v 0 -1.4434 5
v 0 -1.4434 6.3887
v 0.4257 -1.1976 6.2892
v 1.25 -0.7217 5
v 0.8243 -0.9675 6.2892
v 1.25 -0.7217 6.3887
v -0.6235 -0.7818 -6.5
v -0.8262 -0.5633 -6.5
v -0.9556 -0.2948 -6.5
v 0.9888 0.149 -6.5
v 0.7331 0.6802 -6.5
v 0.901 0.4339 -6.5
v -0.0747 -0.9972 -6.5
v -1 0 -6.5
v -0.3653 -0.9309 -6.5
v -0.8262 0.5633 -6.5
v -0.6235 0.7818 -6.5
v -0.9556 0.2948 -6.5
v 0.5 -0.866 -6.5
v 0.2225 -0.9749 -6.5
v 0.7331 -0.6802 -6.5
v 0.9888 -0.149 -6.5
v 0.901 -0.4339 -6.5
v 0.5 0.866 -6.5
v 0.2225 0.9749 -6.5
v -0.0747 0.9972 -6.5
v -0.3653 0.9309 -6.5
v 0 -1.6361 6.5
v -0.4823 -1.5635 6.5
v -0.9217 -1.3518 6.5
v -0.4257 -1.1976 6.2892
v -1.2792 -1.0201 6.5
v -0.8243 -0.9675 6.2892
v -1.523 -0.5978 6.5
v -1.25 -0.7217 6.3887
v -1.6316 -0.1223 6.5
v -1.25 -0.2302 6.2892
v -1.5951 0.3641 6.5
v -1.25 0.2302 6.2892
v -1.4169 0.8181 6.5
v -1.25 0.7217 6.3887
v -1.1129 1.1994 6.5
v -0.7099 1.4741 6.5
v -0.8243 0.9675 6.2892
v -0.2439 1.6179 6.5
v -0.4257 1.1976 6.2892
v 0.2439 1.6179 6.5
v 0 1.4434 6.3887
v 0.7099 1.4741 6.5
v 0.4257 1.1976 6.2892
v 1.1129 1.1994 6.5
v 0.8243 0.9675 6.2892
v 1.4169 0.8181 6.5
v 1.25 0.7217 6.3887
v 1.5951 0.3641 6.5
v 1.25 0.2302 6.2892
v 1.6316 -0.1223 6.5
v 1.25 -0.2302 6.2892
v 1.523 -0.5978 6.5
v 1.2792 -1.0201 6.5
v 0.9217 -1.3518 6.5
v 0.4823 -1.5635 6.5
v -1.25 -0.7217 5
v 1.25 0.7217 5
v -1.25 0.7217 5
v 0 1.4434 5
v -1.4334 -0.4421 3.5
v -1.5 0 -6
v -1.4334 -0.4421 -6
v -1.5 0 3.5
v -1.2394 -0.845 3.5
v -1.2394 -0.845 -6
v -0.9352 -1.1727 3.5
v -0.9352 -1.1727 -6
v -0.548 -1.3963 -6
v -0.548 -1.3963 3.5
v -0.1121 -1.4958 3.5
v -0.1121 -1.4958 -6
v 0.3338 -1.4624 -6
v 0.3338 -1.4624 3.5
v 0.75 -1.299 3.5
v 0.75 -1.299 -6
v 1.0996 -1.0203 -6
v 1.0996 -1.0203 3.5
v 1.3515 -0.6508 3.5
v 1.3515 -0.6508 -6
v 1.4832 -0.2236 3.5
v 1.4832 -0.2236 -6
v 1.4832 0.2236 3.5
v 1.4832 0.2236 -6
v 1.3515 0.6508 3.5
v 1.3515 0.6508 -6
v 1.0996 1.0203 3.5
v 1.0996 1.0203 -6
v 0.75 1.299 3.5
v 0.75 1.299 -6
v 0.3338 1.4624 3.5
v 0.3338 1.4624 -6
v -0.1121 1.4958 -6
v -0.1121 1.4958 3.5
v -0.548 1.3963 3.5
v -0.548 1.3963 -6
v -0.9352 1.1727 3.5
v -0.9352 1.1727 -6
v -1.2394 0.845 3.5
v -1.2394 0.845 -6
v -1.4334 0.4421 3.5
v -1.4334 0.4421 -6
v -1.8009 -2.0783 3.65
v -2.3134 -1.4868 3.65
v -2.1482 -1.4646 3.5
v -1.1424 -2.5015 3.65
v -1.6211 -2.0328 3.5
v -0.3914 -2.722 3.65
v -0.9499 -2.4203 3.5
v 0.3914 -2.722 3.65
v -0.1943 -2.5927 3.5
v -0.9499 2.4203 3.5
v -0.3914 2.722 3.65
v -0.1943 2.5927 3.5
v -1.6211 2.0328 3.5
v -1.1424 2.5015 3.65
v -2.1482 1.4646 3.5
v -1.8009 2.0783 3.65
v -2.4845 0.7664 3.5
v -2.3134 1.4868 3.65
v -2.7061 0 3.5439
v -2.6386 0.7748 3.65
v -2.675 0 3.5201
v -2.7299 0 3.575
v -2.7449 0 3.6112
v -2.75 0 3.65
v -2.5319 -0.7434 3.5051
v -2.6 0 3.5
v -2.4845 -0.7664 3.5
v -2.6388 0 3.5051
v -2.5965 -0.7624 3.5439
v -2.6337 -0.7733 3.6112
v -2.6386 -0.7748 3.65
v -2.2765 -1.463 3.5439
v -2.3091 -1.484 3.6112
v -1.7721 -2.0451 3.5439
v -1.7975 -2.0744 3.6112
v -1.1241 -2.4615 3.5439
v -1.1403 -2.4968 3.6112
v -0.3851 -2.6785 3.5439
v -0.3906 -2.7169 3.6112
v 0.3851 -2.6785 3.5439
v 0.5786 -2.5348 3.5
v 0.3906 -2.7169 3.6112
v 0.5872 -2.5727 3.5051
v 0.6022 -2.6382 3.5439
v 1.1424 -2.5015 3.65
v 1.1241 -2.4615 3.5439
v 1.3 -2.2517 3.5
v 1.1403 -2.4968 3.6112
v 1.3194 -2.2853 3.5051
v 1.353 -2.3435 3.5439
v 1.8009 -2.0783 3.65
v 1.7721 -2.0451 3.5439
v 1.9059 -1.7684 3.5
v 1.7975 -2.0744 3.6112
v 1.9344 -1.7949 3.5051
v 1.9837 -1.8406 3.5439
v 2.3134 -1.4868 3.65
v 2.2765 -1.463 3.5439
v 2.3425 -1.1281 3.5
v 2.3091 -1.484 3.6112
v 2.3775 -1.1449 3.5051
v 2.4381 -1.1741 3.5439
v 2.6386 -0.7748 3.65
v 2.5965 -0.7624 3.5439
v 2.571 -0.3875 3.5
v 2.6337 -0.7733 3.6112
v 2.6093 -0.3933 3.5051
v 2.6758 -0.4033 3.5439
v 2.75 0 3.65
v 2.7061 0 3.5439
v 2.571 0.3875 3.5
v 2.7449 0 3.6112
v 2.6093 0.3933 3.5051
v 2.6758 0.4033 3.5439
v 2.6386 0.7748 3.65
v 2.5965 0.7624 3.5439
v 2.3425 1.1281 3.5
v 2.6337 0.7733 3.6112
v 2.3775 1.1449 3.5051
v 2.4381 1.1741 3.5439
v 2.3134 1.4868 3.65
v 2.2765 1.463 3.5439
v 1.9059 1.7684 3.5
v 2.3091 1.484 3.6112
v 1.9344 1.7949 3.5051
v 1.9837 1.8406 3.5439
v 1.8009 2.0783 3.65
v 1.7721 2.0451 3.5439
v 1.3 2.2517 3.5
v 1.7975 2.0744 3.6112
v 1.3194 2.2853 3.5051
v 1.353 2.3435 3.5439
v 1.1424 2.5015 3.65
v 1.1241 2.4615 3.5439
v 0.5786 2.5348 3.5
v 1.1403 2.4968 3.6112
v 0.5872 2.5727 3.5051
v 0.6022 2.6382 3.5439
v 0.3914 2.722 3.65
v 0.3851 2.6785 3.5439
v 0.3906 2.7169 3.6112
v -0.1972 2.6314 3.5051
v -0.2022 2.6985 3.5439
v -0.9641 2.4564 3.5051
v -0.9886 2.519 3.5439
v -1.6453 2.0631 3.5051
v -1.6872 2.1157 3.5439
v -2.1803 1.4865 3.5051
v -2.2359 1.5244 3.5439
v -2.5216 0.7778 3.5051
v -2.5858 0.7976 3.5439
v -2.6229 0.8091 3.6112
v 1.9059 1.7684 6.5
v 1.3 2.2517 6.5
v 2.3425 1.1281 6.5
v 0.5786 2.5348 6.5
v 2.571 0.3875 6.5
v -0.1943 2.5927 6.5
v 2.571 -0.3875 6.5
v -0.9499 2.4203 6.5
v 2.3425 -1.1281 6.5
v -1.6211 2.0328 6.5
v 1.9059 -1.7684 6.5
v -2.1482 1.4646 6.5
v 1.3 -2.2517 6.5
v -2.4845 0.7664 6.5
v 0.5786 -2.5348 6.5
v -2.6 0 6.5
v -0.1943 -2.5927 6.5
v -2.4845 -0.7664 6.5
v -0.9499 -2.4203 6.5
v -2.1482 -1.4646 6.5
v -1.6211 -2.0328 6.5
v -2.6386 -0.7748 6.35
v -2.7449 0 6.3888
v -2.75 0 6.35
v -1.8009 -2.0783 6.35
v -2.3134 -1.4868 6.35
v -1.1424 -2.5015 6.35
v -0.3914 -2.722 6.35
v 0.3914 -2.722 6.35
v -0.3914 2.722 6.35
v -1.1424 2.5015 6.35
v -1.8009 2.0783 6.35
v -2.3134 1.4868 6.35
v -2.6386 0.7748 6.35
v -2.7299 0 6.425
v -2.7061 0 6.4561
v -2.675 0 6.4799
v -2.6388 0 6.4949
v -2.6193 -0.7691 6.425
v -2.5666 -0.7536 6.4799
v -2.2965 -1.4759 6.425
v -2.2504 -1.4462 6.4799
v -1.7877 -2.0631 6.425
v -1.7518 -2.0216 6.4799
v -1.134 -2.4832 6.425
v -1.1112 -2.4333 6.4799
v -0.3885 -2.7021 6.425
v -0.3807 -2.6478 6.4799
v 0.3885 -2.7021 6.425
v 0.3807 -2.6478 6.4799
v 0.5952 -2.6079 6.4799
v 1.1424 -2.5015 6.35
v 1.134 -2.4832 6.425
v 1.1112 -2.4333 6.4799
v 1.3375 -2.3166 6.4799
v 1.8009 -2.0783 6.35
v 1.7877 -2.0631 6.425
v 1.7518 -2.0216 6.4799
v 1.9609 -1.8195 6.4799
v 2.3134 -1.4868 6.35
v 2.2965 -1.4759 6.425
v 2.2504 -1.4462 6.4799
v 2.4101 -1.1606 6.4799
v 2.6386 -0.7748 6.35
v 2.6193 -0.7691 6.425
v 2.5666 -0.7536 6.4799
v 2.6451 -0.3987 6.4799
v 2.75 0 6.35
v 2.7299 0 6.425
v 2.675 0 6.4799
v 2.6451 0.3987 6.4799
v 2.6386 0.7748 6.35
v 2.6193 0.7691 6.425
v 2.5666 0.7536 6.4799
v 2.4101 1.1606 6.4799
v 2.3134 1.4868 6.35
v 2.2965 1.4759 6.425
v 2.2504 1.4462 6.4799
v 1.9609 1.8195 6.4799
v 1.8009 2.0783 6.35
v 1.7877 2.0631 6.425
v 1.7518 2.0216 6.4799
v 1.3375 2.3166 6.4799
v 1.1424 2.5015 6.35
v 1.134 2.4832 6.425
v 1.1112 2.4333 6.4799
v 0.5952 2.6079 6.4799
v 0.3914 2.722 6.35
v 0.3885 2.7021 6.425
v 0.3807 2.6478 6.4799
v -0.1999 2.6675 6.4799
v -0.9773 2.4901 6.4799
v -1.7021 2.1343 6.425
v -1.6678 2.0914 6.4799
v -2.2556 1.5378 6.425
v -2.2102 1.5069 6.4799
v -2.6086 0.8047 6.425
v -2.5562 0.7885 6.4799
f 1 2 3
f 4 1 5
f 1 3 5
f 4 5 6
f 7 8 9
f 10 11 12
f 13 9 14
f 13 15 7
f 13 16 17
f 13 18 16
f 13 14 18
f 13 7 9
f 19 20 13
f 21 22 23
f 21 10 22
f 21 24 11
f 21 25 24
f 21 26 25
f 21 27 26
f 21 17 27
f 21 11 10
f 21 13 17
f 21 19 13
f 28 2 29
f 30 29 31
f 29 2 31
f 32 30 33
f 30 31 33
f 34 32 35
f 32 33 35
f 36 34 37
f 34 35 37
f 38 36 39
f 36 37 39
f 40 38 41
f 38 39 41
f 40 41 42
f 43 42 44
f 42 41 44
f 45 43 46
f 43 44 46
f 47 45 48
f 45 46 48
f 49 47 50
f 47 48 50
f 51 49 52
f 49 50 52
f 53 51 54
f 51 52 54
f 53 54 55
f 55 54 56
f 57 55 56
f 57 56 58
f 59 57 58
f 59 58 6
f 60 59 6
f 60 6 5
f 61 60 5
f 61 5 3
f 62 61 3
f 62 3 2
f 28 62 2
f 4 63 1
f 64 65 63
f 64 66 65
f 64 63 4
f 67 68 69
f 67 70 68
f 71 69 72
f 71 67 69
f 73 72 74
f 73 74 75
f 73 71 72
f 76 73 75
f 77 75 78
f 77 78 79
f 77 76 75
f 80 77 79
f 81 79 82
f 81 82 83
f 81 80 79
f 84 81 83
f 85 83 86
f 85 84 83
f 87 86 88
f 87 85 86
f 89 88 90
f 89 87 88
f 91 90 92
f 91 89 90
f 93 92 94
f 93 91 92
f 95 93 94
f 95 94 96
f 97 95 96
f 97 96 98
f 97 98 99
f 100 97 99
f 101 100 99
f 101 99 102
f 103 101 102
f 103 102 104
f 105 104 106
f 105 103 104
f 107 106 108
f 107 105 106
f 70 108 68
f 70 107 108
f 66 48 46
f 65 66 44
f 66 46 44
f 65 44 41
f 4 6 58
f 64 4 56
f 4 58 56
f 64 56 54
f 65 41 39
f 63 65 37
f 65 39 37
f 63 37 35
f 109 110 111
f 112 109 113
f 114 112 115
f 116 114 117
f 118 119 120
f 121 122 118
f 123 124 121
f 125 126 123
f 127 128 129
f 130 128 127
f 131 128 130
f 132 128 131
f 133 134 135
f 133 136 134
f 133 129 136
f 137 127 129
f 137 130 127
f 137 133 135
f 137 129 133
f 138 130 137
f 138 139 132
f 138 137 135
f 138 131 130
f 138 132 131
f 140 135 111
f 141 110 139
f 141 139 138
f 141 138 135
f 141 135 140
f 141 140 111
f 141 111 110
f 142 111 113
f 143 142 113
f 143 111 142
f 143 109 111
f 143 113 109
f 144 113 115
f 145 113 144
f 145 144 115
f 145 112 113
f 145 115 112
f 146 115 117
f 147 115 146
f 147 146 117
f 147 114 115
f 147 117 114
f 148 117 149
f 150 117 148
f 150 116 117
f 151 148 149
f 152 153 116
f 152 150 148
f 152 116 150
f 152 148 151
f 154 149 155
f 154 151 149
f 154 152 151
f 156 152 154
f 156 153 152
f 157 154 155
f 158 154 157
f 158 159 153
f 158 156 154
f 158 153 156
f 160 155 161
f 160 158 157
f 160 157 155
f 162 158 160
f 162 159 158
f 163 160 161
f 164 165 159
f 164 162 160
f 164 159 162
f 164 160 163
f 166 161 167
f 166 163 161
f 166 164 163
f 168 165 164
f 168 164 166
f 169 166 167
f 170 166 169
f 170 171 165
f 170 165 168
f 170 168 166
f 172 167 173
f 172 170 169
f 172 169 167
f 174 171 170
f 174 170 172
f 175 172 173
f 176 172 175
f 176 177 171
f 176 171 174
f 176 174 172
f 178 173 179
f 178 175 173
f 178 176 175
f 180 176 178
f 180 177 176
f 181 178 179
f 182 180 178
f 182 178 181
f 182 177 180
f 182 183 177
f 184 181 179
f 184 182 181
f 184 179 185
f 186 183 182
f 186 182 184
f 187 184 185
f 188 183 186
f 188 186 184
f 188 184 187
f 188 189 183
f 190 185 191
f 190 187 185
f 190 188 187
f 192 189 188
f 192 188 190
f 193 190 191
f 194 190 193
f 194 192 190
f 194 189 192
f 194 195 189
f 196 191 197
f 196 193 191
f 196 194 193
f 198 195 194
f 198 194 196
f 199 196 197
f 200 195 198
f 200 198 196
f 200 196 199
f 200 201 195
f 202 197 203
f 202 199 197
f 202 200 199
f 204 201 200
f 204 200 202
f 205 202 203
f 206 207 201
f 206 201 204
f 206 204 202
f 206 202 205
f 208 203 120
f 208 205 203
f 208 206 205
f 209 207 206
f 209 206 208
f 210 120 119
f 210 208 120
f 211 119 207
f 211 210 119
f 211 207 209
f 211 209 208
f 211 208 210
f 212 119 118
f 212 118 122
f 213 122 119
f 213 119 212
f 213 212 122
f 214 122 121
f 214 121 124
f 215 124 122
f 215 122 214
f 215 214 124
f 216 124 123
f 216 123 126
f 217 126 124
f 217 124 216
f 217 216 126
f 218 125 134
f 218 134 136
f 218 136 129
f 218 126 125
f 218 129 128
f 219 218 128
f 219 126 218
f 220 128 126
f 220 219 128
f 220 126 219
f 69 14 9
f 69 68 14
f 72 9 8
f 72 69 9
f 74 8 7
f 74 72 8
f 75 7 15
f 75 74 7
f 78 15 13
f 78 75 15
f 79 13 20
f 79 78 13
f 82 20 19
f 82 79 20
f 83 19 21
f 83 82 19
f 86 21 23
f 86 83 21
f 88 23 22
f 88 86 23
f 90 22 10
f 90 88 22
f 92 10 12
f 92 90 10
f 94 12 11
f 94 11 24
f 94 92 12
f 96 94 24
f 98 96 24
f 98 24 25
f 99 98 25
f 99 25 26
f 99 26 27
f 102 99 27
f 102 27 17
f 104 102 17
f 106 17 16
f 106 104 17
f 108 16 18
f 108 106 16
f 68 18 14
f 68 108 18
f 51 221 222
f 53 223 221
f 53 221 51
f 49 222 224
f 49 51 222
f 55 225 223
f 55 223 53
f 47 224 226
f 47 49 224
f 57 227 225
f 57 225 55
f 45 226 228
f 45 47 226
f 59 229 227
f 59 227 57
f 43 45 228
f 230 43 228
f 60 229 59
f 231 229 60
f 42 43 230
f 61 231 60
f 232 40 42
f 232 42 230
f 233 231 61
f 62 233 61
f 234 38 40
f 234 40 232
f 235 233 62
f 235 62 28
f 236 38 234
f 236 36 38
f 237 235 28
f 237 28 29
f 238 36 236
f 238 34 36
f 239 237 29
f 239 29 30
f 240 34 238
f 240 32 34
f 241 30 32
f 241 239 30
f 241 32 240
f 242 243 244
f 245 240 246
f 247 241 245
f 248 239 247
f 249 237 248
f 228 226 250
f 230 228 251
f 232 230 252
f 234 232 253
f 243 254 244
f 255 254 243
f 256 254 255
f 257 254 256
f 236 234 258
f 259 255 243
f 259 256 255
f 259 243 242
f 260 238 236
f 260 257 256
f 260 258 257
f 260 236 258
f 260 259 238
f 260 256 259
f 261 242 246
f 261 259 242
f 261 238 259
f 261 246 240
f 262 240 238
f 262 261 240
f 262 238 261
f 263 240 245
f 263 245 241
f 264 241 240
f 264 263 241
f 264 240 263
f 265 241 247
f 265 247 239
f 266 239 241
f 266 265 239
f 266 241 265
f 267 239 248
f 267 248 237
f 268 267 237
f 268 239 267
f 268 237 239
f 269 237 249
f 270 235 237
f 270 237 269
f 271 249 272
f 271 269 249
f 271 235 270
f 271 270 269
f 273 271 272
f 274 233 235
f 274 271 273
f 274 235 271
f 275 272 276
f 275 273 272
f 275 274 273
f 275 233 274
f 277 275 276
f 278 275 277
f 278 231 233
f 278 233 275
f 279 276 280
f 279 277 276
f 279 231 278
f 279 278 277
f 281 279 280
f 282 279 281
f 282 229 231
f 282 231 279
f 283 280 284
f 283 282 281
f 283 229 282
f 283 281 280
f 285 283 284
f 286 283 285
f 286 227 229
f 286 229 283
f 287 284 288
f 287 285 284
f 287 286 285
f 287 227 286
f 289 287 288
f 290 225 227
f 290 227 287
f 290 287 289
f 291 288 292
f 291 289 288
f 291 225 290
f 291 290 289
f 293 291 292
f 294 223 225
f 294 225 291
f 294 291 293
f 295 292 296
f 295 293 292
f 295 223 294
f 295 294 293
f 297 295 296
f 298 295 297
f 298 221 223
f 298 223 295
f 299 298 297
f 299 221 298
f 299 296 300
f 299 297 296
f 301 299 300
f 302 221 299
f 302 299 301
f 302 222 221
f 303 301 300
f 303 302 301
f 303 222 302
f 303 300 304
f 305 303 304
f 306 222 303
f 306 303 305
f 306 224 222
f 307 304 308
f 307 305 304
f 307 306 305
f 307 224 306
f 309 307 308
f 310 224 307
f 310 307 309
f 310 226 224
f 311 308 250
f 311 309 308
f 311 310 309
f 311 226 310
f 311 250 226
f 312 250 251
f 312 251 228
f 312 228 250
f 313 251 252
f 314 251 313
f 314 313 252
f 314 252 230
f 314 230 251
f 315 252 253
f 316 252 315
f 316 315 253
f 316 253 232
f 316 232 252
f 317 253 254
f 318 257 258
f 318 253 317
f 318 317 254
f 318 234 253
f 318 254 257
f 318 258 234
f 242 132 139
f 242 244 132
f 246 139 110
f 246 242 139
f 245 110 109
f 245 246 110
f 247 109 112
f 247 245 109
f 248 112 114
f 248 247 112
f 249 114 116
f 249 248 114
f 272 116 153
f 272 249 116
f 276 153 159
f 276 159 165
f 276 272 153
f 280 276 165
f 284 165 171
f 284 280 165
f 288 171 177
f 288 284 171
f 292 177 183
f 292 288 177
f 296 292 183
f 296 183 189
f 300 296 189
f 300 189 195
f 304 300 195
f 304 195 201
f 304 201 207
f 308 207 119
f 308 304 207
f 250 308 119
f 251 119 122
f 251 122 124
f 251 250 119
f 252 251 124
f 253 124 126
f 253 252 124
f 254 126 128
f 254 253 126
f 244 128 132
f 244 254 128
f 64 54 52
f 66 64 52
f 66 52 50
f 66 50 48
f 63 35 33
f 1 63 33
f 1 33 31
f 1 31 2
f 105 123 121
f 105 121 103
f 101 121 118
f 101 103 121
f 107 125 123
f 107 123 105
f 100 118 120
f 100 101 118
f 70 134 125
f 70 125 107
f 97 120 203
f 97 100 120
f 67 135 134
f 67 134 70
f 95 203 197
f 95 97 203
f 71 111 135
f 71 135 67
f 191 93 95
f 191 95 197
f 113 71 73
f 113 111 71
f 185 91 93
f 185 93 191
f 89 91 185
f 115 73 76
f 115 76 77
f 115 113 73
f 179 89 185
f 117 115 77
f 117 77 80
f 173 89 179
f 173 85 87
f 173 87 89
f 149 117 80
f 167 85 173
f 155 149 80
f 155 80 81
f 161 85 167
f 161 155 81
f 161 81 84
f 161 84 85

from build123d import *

# Parameters (mm, degrees)
CUT_EXTRUDE1_START = 6.5
CUT_EXTRUDE1_DEPTH = 1.5


with BuildPart() as part:
    # Sketch2 → Revolve1 (revolve)
    with BuildSketch(Plane(origin=(0, 0, 0), x_dir=(0, 0, -1), z_dir=(1, 0, 0)), mode=Mode.PRIVATE) as revolve1_sk:
        with BuildLine():
            Line((6.5, 0), (6.5, 1))
            Line((6.5, 1), (6, 1.5))
            Line((6, 1.5), (-3.5, 1.5))
            Line((-3.5, 1.5), (-3.5, 2.6))
            ThreePointArc((-3.5, 2.6), (-3.543933983, 2.706066017), (-3.65, 2.75))
            Line((-3.65, 2.75), (-6.35, 2.75))
            ThreePointArc((-6.35, 2.75), (-6.456066017, 2.706066017), (-6.5, 2.6))
            Line((-6.5, 2.6), (-6.5, 0))
            Line((-6.5, 0), (6.5, 0))
        make_face()
    revolve(revolve1_sk.sketch.rotate(Axis((0, 0, -6.5), (0, 0, 1)), 90), axis=Axis((0, 0, -6.5), (0, 0, 1)))

    # Sketch3 → Cut-Extrude1 (cut)
    with BuildSketch(Plane.XY.offset(CUT_EXTRUDE1_START)):
        Polygon((-1.25, 0.721687836), (-1.25, -0.721687836), (0, -1.443375673), (1.25, -0.721687836), (1.25, 0.721687836), (0, 1.443375673), align=None)
    extrude(amount=-CUT_EXTRUDE1_DEPTH, mode=Mode.SUBTRACT)

    # Cut-Extrude2 cone 1 section (through the dimple's axis) → Cut-Extrude2 (revolve, cut)
    with BuildSketch(Plane(origin=(0, 0, 6.5), x_dir=(0, -1, 0), z_dir=(1, 0, 0))):
        Polygon((0, 0), (1.636146394, 0), (0, 0.944629561), align=None)
    revolve(axis=Axis((0, 0, 6.5), (0, 0, -1)), mode=Mode.SUBTRACT)


solid = part.part
